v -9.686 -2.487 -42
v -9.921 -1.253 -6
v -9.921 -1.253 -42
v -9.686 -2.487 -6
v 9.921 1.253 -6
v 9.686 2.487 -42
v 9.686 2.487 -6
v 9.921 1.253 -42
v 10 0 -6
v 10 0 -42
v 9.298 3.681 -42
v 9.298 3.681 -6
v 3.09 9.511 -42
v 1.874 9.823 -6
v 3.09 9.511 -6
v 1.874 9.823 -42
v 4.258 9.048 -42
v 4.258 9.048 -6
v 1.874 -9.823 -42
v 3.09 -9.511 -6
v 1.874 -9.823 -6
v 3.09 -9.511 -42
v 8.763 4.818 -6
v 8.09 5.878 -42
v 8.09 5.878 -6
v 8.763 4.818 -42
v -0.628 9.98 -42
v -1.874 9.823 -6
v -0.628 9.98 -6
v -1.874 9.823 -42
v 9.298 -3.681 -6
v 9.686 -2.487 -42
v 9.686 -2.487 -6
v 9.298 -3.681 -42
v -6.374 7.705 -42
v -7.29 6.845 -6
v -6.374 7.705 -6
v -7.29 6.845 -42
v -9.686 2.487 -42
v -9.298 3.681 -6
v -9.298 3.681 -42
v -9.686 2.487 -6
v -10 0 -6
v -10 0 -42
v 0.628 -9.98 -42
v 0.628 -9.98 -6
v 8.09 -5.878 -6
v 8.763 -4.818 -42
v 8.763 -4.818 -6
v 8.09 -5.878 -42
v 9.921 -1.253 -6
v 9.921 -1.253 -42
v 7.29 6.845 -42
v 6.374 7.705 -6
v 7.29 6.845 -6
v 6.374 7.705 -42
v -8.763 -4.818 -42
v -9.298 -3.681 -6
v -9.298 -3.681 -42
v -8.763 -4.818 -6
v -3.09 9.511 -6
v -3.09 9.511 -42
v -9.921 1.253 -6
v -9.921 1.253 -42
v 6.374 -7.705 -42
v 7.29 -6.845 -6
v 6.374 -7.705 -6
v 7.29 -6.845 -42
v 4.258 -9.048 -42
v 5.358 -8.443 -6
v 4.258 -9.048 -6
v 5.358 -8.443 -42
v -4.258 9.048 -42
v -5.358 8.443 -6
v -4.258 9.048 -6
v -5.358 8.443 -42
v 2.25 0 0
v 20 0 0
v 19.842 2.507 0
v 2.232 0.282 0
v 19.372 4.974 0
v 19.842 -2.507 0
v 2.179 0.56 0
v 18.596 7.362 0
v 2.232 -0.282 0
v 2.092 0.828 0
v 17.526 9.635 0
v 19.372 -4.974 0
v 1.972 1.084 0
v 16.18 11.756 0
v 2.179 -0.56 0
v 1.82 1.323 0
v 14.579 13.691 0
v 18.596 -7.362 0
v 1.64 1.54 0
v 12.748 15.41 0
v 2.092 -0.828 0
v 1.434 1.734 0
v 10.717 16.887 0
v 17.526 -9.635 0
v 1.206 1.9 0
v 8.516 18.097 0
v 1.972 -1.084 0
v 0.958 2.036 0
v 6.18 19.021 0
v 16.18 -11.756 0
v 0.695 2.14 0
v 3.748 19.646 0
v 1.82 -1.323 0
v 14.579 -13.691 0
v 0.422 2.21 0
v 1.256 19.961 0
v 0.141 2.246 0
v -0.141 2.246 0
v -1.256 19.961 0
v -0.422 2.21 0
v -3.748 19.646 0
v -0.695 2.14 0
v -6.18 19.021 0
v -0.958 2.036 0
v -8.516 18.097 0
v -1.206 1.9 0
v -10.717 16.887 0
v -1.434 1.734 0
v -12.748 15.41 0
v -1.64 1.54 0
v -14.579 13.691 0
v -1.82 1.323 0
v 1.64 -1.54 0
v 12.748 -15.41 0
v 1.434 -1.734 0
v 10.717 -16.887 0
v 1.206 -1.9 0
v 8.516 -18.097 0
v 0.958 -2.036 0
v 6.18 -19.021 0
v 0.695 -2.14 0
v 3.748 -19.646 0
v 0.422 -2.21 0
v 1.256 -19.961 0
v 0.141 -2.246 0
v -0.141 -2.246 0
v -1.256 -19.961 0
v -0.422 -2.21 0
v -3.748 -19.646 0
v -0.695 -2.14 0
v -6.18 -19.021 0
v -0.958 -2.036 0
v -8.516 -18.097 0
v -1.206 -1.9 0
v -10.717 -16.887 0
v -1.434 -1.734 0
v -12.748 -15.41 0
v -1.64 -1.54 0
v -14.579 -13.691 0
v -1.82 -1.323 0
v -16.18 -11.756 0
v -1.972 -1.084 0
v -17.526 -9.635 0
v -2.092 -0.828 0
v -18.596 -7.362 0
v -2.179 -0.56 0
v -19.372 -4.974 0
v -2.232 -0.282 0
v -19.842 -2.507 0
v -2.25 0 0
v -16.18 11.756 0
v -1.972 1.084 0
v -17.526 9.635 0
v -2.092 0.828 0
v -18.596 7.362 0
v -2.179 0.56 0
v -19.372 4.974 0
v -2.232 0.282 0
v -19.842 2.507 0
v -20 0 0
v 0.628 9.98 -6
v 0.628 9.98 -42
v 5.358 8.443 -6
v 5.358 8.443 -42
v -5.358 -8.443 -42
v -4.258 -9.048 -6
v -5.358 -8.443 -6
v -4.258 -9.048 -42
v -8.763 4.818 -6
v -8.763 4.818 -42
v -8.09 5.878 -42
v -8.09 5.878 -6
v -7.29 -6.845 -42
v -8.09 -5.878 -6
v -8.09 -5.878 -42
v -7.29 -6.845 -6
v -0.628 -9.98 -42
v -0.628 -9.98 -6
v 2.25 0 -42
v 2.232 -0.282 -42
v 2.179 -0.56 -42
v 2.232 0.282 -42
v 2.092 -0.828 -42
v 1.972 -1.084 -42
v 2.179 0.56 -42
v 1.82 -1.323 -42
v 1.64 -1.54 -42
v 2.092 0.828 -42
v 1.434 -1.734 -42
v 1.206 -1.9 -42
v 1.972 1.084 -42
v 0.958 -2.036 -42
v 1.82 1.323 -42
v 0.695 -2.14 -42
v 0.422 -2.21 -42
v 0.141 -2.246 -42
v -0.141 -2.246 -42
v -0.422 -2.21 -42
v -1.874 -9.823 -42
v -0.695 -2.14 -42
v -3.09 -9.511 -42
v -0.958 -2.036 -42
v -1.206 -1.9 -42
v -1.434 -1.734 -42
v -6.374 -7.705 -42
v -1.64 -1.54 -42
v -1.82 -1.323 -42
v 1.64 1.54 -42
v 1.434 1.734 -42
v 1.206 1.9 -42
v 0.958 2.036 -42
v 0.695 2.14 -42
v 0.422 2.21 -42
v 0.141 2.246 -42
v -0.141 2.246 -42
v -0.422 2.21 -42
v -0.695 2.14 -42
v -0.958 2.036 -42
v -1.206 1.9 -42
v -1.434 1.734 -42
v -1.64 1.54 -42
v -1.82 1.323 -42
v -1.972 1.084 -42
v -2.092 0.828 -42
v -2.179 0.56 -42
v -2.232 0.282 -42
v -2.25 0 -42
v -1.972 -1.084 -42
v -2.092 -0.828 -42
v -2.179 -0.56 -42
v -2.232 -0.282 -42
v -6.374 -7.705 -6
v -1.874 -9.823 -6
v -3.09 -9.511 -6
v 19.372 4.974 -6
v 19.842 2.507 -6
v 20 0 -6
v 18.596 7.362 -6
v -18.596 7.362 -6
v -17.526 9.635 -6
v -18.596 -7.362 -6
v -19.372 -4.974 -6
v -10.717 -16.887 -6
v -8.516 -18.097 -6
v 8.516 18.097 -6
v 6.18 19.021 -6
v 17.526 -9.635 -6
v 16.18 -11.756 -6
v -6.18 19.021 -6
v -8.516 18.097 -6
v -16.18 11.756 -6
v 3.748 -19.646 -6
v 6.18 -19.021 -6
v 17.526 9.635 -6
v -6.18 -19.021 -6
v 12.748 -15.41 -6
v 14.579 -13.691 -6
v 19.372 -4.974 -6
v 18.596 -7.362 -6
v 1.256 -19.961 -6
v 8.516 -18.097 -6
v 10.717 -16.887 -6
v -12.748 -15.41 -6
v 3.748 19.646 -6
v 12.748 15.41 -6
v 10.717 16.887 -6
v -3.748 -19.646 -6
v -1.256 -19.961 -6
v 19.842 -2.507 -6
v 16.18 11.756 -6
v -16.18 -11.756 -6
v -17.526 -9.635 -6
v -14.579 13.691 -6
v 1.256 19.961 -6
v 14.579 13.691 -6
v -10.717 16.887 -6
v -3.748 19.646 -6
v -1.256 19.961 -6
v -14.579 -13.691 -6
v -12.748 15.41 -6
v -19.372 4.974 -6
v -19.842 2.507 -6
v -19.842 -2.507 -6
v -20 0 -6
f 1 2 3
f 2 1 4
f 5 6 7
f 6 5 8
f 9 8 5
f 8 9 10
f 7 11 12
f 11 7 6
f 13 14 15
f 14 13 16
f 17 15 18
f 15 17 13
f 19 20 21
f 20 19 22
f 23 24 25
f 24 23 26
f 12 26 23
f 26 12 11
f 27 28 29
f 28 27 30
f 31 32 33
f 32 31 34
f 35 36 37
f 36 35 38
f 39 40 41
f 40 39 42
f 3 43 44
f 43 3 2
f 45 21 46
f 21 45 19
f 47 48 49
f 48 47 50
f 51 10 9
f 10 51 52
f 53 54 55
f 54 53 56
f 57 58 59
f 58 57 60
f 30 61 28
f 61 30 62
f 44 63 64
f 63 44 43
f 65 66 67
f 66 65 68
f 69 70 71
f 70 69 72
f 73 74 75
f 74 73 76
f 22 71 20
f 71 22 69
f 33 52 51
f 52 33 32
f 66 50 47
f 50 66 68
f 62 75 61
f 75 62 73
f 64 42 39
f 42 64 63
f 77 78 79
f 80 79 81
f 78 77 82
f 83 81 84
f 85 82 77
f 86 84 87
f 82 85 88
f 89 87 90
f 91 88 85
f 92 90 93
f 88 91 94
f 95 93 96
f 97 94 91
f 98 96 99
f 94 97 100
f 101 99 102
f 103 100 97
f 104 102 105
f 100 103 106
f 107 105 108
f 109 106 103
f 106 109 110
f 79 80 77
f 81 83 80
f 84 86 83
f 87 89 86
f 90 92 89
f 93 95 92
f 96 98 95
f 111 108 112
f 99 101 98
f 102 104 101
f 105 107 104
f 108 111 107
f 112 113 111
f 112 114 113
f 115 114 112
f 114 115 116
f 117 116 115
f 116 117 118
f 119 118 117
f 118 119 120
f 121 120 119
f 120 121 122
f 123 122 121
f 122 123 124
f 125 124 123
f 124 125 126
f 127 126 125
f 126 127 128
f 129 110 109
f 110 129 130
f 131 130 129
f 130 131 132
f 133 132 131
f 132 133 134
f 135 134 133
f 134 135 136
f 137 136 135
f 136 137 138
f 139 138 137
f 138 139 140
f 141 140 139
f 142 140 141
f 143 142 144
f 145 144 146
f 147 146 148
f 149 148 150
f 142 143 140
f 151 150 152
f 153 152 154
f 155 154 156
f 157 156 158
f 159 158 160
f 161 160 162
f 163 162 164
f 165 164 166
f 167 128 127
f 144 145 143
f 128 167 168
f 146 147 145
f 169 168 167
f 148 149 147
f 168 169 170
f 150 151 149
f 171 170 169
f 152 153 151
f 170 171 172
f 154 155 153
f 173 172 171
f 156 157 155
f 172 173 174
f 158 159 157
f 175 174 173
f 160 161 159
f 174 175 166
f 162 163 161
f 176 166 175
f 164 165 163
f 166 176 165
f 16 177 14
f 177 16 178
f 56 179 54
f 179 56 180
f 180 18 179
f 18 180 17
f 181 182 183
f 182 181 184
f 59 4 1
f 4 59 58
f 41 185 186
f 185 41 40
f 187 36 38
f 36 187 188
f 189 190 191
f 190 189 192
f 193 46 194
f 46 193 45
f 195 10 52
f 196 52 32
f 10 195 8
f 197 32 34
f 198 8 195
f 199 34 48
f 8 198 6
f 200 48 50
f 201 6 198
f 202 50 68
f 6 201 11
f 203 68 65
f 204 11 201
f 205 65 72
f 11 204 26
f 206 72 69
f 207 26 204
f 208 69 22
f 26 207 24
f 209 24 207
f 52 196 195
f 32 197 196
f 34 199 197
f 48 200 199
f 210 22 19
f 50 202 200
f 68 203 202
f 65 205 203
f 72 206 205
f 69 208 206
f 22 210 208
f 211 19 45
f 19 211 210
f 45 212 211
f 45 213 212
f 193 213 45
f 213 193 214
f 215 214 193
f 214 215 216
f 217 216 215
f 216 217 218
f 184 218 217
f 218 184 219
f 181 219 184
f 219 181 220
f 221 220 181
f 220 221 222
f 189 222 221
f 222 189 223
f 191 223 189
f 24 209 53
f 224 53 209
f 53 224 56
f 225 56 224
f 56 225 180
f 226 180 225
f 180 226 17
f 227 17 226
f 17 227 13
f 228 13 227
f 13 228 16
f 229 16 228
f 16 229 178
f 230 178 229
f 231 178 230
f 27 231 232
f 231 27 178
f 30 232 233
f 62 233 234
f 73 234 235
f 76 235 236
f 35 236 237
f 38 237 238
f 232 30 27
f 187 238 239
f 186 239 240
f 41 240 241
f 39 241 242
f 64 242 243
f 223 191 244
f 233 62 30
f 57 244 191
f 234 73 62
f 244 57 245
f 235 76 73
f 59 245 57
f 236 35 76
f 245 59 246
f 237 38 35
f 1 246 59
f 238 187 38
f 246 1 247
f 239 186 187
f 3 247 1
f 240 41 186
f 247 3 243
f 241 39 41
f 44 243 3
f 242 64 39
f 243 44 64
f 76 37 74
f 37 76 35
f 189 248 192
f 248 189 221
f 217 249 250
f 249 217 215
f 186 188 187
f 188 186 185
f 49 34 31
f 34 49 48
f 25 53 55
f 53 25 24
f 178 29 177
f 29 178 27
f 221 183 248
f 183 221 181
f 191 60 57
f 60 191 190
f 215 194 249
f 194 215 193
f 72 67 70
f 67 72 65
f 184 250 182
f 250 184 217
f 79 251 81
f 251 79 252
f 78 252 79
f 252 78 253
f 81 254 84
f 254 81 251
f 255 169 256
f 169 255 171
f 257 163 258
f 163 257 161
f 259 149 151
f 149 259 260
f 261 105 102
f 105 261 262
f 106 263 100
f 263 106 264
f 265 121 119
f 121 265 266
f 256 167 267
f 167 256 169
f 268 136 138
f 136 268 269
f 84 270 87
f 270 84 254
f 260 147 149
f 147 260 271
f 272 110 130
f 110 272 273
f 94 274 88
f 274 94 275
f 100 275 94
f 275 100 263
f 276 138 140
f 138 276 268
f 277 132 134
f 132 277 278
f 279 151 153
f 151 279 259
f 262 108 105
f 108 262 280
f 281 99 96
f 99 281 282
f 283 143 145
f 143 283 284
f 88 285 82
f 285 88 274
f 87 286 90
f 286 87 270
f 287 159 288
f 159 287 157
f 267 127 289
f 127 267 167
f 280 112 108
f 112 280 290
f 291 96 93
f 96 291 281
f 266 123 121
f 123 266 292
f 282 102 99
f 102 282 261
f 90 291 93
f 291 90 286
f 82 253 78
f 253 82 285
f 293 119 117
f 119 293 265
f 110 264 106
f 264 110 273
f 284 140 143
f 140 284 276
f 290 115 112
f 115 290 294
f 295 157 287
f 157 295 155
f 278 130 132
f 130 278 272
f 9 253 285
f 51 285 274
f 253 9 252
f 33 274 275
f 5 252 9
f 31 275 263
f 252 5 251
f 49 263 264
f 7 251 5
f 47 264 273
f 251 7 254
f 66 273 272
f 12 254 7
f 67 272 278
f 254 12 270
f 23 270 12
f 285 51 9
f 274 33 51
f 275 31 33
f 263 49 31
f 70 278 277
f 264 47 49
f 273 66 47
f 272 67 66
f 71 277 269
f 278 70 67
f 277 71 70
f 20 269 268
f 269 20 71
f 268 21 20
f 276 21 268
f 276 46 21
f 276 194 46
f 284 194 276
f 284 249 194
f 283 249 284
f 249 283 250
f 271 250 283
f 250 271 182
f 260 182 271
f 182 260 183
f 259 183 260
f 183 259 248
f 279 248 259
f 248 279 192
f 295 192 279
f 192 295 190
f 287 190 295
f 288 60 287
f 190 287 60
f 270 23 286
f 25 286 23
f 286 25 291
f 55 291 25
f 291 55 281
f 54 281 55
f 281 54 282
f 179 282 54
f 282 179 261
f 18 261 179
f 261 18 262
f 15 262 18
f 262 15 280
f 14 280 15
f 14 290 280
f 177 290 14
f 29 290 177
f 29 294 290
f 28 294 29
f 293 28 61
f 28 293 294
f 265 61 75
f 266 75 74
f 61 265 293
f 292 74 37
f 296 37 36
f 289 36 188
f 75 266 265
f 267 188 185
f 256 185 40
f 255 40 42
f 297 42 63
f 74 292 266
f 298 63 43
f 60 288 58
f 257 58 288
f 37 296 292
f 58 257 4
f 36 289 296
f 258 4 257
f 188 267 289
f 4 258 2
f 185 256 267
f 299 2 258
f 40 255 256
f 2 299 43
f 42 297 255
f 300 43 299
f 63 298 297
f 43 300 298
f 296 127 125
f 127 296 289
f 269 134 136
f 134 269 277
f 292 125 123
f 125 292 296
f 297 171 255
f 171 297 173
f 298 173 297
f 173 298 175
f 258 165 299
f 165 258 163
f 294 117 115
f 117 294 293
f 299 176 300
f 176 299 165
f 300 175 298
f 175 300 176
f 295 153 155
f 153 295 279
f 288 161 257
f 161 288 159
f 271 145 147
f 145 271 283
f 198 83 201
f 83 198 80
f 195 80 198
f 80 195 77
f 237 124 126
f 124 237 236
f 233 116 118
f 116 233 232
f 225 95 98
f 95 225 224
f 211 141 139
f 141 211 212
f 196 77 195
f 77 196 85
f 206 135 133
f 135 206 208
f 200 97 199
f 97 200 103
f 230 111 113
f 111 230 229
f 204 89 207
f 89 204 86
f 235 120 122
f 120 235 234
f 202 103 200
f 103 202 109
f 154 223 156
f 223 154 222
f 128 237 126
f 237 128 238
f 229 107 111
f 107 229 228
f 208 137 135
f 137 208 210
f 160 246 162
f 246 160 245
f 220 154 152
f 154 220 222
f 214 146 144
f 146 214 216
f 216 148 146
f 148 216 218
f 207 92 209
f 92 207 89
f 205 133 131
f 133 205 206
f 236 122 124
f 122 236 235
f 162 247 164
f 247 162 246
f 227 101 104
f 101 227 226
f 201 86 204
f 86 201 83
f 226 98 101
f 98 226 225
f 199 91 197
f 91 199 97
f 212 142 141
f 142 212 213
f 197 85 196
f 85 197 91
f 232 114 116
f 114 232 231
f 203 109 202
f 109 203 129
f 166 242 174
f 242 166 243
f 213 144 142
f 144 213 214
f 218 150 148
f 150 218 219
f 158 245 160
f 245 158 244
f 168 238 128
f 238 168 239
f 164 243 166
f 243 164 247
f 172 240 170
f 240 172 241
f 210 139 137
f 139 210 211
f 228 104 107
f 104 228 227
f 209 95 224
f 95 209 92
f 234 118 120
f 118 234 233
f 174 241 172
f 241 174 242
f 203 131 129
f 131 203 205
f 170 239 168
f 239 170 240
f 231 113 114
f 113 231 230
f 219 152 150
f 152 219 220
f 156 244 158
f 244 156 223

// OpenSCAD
$fn = 50;


difference() {
	union() {
		translate(v = [0, 0, -42.0000000000]) {
			cylinder(h = 42, r = 10.0000000000);
		}
		translate(v = [0, 0, -6.0000000000]) {
			cylinder(h = 6, r = 20.0000000000);
		}
	}
	union() {
		#translate(v = [0, 0, -42]) {
			cylinder(h = 42, r = 2.2500000000);
		}
	}
}
